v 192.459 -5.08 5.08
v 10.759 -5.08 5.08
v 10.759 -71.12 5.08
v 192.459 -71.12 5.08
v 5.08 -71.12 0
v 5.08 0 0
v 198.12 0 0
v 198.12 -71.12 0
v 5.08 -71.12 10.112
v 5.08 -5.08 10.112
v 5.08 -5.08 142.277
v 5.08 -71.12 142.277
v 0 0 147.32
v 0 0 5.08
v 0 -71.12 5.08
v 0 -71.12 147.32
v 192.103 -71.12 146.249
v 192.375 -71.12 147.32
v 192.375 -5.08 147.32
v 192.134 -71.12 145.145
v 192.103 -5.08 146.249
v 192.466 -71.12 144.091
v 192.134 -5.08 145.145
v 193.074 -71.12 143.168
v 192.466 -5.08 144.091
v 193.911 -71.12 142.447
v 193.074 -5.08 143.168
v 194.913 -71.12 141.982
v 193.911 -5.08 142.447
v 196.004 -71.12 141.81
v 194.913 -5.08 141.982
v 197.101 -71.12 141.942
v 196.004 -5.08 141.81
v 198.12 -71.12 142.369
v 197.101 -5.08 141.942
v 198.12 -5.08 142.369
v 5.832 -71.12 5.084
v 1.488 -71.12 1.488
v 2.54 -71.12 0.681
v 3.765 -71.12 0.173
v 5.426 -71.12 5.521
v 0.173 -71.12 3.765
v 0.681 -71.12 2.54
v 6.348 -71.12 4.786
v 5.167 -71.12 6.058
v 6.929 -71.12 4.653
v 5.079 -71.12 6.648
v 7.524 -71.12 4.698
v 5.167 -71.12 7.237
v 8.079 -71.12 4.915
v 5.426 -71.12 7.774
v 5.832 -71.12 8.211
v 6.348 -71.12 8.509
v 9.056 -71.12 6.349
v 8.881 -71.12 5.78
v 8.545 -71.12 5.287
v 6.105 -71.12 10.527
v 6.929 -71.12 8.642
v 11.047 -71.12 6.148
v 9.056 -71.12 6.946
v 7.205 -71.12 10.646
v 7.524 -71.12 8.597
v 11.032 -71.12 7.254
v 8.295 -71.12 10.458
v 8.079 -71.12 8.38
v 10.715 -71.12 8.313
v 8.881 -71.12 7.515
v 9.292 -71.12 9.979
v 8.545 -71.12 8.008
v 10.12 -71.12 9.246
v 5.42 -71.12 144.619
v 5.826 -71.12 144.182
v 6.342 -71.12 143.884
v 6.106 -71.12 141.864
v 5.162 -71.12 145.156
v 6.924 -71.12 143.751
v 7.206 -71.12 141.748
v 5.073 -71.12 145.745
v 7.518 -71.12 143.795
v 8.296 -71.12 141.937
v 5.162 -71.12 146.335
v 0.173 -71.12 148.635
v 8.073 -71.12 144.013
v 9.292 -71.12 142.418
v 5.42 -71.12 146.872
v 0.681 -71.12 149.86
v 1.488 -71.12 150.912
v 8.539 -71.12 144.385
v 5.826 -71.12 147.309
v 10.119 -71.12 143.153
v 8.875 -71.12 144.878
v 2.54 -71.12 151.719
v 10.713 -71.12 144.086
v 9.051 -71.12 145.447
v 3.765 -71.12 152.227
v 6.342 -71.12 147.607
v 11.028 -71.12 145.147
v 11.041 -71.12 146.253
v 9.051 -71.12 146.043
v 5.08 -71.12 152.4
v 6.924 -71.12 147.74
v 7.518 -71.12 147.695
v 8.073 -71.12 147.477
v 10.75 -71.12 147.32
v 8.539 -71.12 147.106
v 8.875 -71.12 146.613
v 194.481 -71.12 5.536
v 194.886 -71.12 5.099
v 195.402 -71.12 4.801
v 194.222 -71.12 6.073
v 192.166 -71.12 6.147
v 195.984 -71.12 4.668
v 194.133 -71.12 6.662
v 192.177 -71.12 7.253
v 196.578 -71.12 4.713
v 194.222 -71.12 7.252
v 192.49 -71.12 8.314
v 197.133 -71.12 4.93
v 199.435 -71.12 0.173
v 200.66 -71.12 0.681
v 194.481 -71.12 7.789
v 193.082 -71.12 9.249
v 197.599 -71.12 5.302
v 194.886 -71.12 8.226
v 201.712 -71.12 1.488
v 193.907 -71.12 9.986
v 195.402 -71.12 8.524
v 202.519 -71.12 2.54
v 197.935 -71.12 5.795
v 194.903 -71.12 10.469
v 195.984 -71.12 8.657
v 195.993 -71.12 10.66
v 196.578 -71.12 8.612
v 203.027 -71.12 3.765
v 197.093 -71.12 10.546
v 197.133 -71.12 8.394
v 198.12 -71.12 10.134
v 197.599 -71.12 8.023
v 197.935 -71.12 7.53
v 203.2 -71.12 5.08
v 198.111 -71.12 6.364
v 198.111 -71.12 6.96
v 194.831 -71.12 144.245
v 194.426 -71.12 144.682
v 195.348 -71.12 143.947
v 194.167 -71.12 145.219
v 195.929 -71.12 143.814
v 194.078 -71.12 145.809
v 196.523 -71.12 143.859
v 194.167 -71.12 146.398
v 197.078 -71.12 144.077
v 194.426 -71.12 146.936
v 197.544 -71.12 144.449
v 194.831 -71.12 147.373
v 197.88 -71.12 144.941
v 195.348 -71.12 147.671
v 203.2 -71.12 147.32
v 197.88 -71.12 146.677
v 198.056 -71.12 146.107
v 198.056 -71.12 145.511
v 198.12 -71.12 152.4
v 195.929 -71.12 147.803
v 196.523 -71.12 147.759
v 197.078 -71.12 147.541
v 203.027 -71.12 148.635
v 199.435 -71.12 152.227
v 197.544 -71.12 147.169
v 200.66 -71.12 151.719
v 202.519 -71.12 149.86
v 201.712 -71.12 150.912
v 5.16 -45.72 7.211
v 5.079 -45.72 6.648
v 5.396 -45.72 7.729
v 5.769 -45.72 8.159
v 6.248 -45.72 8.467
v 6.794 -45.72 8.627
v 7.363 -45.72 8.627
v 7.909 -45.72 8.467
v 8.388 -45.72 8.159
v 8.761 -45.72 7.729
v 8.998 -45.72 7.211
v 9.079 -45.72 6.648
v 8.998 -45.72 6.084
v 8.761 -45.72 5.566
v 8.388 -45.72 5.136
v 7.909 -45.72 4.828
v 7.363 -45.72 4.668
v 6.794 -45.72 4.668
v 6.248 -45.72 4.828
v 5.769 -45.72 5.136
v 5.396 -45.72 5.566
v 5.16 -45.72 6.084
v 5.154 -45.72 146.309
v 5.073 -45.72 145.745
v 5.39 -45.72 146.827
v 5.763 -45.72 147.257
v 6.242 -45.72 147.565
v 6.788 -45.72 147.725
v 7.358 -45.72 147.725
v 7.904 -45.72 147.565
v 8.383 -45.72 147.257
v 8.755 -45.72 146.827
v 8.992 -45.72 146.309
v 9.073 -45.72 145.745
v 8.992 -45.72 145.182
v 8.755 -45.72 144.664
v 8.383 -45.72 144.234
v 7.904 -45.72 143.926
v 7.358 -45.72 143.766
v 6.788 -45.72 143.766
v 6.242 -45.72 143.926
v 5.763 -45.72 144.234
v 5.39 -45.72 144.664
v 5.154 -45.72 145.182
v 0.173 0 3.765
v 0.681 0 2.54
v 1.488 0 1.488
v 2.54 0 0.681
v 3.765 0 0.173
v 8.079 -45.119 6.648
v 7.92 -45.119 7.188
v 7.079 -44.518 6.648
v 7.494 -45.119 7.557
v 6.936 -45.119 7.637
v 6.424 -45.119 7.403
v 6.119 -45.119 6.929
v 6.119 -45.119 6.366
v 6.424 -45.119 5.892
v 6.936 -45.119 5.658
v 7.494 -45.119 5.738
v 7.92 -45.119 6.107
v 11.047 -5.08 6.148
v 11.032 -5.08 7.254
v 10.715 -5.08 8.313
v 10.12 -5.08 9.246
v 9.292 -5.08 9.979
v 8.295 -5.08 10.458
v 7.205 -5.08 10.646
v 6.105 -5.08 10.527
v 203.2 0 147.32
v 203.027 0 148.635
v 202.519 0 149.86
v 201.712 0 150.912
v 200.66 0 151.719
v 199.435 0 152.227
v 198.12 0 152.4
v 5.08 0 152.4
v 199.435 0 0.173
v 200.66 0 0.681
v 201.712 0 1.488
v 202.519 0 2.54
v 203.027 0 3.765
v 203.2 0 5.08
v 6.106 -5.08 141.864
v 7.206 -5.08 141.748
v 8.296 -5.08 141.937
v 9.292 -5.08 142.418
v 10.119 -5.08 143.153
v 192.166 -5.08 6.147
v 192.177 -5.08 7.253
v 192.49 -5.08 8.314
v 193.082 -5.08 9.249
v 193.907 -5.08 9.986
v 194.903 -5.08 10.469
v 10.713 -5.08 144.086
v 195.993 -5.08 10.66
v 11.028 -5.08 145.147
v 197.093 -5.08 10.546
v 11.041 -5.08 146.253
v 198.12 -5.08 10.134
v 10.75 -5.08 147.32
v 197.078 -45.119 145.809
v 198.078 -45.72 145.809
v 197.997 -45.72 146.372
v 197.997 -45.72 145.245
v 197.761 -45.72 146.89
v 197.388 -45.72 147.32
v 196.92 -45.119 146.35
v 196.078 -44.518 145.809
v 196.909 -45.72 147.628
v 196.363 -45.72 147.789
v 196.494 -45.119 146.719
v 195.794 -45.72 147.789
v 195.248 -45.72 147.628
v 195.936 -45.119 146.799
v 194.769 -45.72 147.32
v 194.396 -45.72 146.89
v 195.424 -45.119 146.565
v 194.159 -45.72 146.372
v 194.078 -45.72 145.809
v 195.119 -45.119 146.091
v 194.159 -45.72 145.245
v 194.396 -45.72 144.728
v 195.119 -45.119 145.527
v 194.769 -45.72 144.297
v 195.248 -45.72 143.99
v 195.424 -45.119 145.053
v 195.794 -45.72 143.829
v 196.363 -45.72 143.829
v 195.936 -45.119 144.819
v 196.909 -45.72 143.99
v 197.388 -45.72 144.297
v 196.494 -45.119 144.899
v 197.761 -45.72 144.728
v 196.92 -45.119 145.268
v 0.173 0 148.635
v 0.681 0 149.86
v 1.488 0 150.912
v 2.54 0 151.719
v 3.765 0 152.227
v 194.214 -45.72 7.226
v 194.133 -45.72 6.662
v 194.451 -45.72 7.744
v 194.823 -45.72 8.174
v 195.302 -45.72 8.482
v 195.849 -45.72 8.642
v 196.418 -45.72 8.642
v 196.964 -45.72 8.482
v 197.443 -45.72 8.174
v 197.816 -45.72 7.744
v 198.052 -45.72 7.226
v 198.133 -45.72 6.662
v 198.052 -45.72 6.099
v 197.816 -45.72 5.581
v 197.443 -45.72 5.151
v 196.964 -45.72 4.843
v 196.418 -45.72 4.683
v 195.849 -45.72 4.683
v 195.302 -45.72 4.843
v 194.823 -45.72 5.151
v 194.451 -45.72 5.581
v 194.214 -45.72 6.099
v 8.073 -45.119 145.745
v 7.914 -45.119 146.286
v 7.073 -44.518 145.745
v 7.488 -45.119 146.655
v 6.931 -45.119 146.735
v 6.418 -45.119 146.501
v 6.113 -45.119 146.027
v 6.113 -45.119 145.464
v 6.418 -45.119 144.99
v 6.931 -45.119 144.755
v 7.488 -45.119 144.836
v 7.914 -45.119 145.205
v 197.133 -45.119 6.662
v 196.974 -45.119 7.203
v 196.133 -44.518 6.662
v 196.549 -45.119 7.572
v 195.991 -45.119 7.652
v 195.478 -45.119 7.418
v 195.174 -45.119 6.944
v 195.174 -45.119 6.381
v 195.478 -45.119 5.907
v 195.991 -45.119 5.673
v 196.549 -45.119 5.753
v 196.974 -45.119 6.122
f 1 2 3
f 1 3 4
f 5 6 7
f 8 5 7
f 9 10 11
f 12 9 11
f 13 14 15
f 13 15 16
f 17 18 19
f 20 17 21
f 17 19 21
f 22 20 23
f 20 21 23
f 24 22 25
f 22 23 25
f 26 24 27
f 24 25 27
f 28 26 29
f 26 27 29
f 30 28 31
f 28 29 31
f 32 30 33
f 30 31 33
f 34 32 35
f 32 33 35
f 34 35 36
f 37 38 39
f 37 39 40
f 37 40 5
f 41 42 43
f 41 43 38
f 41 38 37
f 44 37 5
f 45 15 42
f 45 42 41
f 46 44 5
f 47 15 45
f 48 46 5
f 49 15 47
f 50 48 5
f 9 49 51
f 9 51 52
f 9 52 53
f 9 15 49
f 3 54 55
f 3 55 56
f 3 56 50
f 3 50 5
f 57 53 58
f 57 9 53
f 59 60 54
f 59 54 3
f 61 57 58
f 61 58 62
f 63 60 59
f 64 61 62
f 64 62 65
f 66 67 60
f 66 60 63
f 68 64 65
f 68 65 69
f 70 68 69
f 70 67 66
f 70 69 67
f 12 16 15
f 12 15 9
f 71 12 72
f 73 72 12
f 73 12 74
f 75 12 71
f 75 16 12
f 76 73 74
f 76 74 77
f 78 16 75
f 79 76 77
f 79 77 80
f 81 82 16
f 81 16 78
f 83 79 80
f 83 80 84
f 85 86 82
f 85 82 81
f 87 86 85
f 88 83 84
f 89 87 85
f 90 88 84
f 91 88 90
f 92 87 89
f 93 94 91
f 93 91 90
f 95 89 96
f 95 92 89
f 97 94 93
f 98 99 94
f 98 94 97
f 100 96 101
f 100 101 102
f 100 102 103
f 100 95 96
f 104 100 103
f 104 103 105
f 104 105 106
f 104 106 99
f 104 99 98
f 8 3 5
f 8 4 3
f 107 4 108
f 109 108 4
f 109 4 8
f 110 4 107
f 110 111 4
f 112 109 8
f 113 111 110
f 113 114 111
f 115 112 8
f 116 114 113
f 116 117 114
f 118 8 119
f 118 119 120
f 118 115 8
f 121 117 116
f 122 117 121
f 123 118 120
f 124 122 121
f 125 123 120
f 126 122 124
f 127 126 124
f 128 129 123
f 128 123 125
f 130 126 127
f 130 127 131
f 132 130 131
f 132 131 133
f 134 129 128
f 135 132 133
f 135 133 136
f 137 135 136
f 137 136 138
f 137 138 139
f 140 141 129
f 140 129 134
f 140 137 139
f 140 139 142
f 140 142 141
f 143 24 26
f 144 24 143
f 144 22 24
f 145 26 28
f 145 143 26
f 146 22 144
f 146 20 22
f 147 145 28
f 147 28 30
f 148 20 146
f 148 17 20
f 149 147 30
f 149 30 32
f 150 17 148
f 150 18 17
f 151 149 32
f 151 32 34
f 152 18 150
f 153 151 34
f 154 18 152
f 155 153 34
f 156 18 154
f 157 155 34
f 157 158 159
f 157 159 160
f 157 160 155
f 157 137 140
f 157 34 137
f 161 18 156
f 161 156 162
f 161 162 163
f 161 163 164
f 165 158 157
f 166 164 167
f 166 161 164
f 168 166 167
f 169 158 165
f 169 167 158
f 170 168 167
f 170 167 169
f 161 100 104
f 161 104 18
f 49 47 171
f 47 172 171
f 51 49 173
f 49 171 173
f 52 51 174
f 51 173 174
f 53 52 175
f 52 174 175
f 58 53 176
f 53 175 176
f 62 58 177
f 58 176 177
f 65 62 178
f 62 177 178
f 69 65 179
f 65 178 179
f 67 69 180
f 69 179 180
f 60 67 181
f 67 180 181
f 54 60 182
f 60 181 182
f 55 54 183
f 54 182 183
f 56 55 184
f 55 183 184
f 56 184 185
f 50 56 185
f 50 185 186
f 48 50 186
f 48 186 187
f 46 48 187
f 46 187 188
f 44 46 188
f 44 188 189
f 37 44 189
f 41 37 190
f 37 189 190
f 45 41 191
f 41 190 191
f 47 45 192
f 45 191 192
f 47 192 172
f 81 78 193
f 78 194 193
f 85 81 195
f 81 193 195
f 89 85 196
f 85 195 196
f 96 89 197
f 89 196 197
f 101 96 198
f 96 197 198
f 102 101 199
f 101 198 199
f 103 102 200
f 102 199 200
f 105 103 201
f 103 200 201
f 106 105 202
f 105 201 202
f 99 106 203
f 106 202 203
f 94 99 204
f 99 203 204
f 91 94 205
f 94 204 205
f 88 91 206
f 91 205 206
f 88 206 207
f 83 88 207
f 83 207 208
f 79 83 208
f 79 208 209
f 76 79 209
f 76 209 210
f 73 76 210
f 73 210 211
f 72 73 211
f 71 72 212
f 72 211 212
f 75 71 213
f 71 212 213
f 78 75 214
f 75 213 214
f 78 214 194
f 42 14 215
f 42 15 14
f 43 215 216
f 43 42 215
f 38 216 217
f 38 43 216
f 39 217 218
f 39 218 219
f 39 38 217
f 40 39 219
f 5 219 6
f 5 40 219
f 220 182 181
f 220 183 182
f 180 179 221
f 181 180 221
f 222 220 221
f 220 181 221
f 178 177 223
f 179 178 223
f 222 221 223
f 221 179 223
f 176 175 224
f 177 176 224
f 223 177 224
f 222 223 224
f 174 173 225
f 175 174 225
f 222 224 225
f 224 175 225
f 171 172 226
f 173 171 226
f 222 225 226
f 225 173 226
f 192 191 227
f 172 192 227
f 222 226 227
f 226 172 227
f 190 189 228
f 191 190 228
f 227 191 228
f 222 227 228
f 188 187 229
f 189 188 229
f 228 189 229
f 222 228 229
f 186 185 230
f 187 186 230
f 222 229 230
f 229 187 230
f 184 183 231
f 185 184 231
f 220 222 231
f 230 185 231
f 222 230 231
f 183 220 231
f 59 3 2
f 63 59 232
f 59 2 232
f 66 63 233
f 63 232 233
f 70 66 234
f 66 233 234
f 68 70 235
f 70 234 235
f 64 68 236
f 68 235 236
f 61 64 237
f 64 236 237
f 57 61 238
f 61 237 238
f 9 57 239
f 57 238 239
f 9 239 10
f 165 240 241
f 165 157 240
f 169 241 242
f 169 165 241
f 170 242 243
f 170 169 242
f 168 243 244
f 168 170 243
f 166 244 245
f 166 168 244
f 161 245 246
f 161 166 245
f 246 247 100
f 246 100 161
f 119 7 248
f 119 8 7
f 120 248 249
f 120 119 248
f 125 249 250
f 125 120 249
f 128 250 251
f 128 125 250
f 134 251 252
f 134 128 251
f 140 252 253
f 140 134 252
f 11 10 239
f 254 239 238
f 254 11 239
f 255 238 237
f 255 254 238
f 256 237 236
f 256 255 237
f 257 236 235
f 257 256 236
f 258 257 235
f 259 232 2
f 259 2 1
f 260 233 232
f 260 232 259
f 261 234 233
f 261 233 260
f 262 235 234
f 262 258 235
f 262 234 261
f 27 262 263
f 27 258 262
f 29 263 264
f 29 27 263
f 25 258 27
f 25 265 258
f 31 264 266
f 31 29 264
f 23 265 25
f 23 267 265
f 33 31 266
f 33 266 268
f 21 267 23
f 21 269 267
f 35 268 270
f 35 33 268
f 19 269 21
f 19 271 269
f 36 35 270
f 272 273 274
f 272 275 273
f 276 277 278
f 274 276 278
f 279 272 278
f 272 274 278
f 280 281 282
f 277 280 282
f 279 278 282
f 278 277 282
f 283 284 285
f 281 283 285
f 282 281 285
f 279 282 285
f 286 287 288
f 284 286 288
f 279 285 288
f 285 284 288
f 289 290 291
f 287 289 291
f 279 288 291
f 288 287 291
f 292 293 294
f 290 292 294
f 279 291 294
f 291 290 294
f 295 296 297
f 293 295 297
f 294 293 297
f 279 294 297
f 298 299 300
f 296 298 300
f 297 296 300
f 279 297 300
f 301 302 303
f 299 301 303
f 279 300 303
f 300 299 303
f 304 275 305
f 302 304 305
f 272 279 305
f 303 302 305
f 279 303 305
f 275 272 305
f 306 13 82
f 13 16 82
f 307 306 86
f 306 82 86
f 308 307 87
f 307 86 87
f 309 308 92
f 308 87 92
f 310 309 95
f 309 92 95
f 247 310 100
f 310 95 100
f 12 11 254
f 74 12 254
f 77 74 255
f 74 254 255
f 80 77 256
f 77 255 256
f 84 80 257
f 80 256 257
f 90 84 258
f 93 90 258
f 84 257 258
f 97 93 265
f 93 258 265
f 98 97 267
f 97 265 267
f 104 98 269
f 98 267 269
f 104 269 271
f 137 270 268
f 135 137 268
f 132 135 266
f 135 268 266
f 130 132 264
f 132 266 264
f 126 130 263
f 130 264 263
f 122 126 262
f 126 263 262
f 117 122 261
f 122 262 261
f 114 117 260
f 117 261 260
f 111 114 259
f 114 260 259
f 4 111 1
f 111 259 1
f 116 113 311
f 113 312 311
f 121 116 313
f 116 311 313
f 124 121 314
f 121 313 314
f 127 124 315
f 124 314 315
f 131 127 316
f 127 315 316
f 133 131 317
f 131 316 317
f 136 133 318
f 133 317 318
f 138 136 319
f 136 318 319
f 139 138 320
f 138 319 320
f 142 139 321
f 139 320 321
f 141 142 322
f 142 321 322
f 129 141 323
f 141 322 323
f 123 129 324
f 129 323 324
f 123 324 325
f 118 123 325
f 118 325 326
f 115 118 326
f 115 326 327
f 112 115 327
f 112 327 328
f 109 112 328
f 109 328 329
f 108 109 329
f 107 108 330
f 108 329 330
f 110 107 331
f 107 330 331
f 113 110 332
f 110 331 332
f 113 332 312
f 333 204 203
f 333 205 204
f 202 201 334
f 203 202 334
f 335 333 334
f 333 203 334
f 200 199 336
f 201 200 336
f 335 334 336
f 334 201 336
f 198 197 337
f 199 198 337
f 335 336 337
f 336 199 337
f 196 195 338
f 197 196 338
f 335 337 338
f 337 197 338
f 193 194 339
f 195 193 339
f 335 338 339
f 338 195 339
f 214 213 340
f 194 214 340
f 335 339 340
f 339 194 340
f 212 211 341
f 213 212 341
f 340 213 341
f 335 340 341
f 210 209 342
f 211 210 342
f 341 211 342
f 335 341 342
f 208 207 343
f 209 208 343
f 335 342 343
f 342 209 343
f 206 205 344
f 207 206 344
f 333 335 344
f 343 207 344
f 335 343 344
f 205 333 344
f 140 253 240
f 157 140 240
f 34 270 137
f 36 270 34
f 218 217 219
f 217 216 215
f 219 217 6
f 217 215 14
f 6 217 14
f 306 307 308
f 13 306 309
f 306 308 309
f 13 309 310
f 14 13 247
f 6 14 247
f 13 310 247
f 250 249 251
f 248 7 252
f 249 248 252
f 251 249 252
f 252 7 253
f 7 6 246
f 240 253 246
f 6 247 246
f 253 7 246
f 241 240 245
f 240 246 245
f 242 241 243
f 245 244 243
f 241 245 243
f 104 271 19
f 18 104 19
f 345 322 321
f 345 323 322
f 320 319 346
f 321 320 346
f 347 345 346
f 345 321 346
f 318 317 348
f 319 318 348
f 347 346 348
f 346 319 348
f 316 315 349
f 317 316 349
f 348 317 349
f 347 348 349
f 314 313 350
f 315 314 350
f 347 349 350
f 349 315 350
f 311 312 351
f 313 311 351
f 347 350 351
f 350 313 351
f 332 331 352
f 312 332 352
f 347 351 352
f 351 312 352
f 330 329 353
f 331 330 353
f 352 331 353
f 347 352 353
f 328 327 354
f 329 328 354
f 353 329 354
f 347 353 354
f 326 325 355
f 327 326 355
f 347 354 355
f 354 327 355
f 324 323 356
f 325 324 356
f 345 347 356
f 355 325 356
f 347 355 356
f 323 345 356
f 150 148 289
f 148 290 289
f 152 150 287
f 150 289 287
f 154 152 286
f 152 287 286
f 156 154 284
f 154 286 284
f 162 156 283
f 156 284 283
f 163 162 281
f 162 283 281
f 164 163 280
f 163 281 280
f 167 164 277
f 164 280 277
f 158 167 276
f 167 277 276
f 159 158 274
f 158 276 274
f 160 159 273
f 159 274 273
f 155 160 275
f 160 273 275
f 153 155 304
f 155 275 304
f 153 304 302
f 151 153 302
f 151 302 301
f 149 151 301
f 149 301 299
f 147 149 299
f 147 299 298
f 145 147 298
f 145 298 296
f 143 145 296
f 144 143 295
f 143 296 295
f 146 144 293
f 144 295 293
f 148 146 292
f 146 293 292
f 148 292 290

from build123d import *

# Parameters (mm, degrees)
F0_W     = 203.2
F0_H     = 152.4
F1_DEPTH = 71.12
F2_R     = 5.08
F3_T     = 5.08
F4_R     = 4
F5_DEPTH = 71.12
F7_D     = 4
F7_DEPTH = 25.4
F7_TIP   = 1.2017212381


# Not quite as in the source:
# - a shell that OpenCascade refuses in one call is made with other operations: the cavity is built on its own and cut out


with BuildPart() as f1:
    # F0 (on Front) → F1 (new body)
    with BuildSketch(Plane.XZ):
        with Locations((101.6, 76.2)):
            Rectangle(F0_W, F0_H)
    extrude(amount=F1_DEPTH)

    # F2
    f2_edges = [f1.edges().sort_by_distance(p)[0] for p in [
        (0, -35.56, 152.4),
        (0, -35.56, 0),
        (203.2, -35.56, 152.4),
        (203.2, -35.56, 0),
    ]]
    fillet(f2_edges, radius=F2_R)

    # F3: shell of thickness 5.08, made by hand


with BuildPart() as f3_core1:
    # F3_t2: copy of F1
    add(f1.part)

    # the walls: a layer under each face that stays
    f3_faces = [f3_core1.faces().sort_by_distance(p)[0] for p in [
        (0, -35.56, 76.2),
        (101.6, 0, 76.2),
        (101.6, -35.56, 152.4),
        (101.6, -35.56, 0),
        (203.2, -35.56, 76.2),
    ]]
    thicken(f3_faces, amount=-F3_T, mode=Mode.SUBTRACT)


with BuildPart() as f1_1:
    add(f1.part)

    # what is left inside the walls is the cavity
    f3_cavity = [f3_core1.part.solids().sort_by_distance(p)[0] for p in [
        (101.6, -5.1308, 52.493333),
    ]]
    add(f3_cavity, mode=Mode.SUBTRACT)

    # F4 (on Front) → F5 (join)
    with BuildSketch(Plane.XZ):
        with Locations((7.0729700904, 145.7453031343)):
            Circle(F4_R)
        with Locations((196.0783849807, 145.8089049954)):
            Circle(F4_R)
        with Locations((7.0786034794, 6.6475407913)):
            Circle(F4_R)
        with Locations((196.1331322956, 6.6623895618)):
            Circle(F4_R)
    extrude(amount=F5_DEPTH)

    # F7
    with Locations(Plane.XZ.offset(71.12)):
        with Locations((7.0729700904, 145.7453031343), (7.0786034794, 6.6475407913), (196.1331322956, 6.6623895618), (196.0783849807, 145.8089049954)):
            Hole(F7_D / 2, depth=F7_DEPTH)
            with Locations((0, 0, -(F7_DEPTH + F7_TIP / 2))):  # 118° drill point
                Cone(0, F7_D / 2, F7_TIP, mode=Mode.SUBTRACT)


solid = f1_1.part
